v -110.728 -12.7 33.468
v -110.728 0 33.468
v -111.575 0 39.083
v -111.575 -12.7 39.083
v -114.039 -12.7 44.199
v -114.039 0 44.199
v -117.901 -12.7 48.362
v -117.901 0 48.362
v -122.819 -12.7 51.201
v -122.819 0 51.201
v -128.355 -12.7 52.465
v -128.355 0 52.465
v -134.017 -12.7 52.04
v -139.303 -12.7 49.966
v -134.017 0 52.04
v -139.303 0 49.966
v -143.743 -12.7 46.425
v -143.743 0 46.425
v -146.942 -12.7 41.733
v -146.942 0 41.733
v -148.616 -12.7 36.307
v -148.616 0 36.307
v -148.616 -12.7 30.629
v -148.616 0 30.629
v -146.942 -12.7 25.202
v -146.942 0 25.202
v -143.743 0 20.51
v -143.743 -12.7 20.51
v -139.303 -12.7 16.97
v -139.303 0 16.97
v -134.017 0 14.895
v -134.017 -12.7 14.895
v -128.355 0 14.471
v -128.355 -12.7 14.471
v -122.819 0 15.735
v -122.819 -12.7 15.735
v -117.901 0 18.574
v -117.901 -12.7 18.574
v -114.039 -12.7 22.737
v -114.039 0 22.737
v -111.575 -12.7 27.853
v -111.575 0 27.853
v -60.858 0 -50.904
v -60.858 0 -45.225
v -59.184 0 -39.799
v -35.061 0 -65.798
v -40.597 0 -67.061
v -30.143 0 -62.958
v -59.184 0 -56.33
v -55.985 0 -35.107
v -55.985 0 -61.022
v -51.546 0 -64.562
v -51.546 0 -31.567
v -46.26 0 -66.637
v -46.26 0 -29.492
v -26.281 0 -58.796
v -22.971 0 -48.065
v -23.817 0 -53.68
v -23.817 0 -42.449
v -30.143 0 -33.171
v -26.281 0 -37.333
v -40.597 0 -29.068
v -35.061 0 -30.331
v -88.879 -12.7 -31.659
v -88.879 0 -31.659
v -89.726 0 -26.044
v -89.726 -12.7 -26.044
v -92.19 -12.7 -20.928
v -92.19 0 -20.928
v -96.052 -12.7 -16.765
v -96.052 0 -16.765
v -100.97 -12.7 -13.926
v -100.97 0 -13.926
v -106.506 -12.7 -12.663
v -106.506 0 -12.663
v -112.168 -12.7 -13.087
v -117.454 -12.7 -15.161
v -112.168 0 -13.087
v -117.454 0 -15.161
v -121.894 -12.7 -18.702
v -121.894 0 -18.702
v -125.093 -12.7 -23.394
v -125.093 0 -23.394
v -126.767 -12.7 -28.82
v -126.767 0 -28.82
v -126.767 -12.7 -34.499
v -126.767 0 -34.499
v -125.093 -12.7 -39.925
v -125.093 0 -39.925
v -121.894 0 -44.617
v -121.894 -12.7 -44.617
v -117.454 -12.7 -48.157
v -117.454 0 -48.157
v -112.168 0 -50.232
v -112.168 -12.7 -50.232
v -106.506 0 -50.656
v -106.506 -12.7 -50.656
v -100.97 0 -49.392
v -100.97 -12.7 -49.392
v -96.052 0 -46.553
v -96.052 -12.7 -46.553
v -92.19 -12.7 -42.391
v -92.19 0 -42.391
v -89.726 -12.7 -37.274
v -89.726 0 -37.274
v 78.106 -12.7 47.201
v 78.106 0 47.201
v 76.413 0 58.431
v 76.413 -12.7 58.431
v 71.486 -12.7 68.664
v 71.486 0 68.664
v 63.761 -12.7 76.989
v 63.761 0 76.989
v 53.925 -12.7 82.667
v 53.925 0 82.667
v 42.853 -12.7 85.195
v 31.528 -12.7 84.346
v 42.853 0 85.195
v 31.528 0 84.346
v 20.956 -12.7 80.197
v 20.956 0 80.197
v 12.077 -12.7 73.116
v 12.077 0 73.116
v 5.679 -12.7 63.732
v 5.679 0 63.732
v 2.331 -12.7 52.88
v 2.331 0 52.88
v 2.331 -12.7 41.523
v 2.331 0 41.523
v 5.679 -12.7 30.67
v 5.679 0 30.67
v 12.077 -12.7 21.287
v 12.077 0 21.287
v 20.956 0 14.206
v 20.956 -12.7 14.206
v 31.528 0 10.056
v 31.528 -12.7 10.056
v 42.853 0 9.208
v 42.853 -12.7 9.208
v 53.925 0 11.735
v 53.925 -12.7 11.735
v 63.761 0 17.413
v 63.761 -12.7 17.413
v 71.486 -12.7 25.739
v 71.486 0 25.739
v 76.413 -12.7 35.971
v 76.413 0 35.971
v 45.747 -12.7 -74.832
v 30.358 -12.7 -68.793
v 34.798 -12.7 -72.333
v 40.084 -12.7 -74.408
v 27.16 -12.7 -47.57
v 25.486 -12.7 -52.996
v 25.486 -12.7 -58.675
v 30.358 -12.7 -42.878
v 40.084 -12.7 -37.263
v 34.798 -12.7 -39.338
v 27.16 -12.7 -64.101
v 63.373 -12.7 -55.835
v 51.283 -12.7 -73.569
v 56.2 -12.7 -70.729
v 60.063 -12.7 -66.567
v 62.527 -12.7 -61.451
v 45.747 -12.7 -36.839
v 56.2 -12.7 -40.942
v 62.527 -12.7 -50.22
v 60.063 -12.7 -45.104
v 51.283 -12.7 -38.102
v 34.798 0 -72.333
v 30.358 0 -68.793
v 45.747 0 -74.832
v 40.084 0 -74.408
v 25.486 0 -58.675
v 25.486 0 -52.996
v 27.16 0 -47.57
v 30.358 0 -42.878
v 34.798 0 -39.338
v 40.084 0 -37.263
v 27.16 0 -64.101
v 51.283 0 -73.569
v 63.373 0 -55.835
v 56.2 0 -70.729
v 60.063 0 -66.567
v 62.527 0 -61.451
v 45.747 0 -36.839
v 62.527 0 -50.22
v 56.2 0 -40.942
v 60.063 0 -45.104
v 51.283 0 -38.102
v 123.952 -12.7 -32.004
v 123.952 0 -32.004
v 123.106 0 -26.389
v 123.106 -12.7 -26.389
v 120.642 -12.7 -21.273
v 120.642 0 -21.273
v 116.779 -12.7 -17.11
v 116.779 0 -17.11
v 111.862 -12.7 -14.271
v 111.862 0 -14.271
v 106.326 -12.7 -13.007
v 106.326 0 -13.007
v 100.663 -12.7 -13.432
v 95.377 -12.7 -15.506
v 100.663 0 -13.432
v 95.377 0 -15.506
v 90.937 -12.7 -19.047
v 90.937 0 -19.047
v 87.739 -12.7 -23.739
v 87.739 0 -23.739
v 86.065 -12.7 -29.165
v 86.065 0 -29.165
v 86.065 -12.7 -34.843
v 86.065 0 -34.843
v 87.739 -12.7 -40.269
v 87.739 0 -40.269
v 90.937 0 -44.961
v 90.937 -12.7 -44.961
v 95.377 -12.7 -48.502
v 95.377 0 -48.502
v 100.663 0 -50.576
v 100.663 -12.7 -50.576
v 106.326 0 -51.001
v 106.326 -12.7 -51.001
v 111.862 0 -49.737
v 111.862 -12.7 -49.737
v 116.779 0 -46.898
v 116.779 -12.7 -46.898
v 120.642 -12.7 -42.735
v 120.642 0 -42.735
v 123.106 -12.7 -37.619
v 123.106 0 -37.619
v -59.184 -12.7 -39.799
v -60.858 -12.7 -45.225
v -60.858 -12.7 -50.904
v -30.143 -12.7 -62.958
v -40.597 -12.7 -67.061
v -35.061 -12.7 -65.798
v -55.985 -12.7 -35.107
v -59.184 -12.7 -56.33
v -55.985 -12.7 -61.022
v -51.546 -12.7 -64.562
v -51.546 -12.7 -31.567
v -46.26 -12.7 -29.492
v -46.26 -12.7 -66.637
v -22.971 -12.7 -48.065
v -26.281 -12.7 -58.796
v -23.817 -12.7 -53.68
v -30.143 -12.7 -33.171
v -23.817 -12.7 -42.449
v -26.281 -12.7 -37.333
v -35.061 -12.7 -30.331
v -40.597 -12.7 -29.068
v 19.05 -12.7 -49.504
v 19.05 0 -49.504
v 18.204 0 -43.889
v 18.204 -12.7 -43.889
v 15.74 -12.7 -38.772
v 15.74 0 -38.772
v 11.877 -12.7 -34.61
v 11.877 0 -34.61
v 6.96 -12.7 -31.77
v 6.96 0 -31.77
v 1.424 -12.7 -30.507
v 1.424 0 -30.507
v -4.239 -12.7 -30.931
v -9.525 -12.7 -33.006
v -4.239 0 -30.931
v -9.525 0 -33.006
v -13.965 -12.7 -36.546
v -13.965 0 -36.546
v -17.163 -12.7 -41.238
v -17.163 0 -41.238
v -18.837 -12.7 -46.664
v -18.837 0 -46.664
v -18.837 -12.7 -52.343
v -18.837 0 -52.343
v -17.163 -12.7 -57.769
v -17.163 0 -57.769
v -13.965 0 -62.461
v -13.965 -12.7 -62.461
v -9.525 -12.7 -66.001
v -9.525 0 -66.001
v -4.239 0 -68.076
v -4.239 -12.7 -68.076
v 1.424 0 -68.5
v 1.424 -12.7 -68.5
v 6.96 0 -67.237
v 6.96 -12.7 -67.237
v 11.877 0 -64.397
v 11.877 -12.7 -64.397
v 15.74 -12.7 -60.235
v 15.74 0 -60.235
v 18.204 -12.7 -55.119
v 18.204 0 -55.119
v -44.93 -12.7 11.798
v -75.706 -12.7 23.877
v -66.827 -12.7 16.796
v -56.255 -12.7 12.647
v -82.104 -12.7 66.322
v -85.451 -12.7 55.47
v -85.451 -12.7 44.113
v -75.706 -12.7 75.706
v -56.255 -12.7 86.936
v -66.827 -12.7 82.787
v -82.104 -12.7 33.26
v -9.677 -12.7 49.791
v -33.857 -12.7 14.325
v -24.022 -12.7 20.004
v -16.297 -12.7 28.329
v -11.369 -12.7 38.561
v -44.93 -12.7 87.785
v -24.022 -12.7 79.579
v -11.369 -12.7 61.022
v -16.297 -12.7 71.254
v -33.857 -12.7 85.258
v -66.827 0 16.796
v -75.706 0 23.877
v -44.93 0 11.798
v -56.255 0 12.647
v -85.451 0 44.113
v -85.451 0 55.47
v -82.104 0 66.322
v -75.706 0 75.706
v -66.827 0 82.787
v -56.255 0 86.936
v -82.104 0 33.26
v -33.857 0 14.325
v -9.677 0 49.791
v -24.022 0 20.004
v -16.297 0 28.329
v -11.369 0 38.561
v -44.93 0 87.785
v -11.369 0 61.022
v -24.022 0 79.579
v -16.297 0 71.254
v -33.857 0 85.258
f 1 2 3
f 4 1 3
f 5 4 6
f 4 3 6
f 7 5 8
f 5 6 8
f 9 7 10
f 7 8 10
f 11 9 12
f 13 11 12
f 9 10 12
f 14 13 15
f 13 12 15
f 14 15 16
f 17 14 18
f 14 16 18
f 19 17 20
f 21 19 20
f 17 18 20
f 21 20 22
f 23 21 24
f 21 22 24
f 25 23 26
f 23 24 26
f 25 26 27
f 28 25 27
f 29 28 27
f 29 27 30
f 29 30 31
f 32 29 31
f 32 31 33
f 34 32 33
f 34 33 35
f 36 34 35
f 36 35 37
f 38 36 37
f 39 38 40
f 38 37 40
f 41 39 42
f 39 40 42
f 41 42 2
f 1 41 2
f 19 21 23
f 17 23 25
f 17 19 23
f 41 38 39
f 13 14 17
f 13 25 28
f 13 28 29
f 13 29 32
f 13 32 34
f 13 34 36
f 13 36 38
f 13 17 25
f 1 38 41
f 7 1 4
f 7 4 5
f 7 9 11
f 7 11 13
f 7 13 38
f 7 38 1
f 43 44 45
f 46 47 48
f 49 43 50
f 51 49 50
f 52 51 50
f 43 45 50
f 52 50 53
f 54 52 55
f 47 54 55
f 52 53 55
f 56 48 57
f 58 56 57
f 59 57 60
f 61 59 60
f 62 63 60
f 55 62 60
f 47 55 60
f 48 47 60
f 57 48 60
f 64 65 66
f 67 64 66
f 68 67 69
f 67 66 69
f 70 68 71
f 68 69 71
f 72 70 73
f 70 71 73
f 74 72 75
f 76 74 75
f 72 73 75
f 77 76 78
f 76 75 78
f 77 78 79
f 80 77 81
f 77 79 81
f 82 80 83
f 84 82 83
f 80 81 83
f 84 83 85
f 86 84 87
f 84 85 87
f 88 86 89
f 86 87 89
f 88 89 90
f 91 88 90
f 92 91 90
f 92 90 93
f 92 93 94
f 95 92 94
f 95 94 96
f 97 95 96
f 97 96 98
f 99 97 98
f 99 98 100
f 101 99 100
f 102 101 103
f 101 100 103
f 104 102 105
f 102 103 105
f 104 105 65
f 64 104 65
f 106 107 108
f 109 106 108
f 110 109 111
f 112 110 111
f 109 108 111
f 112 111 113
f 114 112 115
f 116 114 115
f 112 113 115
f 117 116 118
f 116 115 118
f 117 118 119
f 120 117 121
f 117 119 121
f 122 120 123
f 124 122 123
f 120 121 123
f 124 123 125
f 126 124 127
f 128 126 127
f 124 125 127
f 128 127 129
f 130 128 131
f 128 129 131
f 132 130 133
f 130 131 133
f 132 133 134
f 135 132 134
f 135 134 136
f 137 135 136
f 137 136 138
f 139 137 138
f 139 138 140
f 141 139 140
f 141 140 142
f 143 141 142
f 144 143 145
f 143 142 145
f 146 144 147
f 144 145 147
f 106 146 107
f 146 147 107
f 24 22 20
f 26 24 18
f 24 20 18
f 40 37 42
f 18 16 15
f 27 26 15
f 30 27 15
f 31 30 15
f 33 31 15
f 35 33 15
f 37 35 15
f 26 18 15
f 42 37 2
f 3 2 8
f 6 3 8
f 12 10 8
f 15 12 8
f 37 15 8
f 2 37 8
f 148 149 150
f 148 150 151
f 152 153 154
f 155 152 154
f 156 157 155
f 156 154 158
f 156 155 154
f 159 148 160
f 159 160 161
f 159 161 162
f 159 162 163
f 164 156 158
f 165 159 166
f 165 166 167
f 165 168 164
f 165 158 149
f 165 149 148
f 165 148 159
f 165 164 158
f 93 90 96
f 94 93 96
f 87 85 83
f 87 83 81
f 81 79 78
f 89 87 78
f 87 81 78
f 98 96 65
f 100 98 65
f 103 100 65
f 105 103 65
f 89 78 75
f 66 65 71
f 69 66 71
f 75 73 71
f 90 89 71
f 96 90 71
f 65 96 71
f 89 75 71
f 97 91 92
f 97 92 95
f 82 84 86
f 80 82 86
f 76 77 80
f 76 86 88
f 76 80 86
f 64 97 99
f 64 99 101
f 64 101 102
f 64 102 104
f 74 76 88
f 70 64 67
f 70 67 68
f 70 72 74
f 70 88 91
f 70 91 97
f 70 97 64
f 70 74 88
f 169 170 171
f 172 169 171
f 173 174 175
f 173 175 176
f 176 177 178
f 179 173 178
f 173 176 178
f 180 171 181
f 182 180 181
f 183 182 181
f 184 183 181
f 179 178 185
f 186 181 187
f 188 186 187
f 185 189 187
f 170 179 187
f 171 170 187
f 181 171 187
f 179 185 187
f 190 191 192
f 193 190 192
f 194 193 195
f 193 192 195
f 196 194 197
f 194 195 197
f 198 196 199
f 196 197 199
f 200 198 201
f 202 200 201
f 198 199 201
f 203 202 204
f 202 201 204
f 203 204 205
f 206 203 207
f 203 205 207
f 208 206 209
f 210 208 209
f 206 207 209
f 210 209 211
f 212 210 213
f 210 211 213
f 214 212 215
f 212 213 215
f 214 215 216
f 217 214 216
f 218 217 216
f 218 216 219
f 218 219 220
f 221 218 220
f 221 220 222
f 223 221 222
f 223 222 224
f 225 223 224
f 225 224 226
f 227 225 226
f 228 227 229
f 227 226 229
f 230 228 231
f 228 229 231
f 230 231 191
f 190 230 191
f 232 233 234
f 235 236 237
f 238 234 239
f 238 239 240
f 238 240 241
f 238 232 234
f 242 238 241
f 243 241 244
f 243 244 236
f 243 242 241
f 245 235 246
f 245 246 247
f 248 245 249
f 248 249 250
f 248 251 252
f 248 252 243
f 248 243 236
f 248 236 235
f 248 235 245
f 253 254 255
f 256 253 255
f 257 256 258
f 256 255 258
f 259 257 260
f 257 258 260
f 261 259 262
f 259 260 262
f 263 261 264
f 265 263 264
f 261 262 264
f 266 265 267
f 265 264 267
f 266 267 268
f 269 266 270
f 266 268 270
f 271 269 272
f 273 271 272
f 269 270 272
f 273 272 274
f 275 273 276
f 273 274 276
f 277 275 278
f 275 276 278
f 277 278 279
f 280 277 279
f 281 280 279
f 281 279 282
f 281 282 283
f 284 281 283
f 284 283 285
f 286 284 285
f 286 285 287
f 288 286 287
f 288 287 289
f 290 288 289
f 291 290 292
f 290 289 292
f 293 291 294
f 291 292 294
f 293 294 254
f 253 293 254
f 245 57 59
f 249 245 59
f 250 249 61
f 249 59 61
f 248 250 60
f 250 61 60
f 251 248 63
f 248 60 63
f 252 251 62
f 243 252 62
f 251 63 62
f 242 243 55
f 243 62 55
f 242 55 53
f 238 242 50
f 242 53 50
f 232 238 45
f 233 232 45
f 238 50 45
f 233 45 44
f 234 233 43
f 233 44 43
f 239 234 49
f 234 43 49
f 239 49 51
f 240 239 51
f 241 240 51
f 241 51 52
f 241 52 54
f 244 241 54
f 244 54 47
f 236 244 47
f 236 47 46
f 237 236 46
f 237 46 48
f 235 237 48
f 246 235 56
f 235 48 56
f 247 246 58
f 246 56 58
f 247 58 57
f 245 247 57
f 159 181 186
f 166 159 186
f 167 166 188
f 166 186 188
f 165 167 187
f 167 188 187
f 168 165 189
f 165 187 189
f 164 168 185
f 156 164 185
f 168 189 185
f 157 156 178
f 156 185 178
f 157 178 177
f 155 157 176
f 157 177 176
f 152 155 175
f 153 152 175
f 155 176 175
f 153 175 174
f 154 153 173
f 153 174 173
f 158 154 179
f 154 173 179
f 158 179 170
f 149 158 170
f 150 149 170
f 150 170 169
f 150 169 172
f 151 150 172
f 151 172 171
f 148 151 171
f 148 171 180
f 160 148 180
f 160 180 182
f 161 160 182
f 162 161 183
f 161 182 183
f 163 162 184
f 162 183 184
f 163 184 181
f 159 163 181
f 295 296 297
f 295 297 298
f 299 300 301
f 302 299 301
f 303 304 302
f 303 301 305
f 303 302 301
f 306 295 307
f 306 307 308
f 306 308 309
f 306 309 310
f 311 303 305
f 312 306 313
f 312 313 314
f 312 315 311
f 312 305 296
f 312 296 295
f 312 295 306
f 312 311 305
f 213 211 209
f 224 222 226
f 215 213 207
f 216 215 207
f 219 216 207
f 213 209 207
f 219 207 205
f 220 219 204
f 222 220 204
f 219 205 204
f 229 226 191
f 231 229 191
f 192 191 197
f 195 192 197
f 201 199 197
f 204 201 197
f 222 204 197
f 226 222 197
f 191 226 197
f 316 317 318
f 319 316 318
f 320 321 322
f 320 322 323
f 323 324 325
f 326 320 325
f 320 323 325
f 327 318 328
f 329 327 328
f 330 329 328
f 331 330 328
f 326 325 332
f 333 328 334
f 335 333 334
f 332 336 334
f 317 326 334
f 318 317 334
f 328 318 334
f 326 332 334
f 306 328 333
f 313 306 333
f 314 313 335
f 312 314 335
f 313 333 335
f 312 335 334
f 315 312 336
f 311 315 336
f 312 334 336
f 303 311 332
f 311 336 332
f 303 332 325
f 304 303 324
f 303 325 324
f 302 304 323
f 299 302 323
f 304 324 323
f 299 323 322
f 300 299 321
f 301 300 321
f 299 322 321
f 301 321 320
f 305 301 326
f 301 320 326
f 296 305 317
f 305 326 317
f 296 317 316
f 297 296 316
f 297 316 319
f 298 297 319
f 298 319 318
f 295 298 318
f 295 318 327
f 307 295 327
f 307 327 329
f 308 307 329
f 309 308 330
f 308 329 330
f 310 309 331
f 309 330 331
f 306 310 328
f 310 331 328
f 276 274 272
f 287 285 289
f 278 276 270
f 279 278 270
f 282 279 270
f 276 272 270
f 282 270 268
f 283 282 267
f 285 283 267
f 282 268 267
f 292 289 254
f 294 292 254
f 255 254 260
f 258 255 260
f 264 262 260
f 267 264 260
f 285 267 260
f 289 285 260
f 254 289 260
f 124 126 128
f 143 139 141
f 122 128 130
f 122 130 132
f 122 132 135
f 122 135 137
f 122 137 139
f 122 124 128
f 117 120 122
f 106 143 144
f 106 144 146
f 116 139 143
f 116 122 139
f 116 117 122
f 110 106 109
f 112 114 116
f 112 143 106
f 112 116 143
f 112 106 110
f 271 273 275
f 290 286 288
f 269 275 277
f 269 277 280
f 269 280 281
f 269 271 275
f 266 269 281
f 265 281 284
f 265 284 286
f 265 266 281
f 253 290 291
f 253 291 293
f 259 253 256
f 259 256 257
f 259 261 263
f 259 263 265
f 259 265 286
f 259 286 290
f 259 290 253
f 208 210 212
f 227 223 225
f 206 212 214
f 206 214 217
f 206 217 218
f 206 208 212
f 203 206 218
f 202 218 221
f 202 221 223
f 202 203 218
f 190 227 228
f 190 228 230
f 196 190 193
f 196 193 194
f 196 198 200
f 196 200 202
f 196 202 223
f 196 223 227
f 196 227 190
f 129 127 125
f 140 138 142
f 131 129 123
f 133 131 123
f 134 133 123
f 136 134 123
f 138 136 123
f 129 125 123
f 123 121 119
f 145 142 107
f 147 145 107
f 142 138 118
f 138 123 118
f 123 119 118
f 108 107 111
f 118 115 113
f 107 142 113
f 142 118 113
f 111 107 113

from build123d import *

# Parameters (mm, degrees)
F0_R     = 38.1
F0_R_2   = 19.05
F1_DEPTH = 12.7


with BuildPart() as f1:
    # F0 (on Front) → F1 (new body)
    with BuildSketch(Plane.XZ):
        with Locations((-47.776735, 49.791419)):
            Circle(F0_R)
        with Locations((40.005818, 47.201112)):
            Circle(F0_R)
        with Locations((-42.020502, -48.064548)):
            Circle(F0_R_2)
        with Locations((0, -49.503606)):
            Circle(F0_R_2)
        with Locations((44.322996, -55.835461)):
            Circle(F0_R_2)
        with Locations((-107.92937, -31.659282)):
            Circle(F0_R_2)
        with Locations((104.901999, -32.004002)):
            Circle(F0_R_2)
        with Locations((-129.778475, 33.46777)):
            Circle(F0_R_2)
    extrude(amount=F1_DEPTH)


solid = f1.part
